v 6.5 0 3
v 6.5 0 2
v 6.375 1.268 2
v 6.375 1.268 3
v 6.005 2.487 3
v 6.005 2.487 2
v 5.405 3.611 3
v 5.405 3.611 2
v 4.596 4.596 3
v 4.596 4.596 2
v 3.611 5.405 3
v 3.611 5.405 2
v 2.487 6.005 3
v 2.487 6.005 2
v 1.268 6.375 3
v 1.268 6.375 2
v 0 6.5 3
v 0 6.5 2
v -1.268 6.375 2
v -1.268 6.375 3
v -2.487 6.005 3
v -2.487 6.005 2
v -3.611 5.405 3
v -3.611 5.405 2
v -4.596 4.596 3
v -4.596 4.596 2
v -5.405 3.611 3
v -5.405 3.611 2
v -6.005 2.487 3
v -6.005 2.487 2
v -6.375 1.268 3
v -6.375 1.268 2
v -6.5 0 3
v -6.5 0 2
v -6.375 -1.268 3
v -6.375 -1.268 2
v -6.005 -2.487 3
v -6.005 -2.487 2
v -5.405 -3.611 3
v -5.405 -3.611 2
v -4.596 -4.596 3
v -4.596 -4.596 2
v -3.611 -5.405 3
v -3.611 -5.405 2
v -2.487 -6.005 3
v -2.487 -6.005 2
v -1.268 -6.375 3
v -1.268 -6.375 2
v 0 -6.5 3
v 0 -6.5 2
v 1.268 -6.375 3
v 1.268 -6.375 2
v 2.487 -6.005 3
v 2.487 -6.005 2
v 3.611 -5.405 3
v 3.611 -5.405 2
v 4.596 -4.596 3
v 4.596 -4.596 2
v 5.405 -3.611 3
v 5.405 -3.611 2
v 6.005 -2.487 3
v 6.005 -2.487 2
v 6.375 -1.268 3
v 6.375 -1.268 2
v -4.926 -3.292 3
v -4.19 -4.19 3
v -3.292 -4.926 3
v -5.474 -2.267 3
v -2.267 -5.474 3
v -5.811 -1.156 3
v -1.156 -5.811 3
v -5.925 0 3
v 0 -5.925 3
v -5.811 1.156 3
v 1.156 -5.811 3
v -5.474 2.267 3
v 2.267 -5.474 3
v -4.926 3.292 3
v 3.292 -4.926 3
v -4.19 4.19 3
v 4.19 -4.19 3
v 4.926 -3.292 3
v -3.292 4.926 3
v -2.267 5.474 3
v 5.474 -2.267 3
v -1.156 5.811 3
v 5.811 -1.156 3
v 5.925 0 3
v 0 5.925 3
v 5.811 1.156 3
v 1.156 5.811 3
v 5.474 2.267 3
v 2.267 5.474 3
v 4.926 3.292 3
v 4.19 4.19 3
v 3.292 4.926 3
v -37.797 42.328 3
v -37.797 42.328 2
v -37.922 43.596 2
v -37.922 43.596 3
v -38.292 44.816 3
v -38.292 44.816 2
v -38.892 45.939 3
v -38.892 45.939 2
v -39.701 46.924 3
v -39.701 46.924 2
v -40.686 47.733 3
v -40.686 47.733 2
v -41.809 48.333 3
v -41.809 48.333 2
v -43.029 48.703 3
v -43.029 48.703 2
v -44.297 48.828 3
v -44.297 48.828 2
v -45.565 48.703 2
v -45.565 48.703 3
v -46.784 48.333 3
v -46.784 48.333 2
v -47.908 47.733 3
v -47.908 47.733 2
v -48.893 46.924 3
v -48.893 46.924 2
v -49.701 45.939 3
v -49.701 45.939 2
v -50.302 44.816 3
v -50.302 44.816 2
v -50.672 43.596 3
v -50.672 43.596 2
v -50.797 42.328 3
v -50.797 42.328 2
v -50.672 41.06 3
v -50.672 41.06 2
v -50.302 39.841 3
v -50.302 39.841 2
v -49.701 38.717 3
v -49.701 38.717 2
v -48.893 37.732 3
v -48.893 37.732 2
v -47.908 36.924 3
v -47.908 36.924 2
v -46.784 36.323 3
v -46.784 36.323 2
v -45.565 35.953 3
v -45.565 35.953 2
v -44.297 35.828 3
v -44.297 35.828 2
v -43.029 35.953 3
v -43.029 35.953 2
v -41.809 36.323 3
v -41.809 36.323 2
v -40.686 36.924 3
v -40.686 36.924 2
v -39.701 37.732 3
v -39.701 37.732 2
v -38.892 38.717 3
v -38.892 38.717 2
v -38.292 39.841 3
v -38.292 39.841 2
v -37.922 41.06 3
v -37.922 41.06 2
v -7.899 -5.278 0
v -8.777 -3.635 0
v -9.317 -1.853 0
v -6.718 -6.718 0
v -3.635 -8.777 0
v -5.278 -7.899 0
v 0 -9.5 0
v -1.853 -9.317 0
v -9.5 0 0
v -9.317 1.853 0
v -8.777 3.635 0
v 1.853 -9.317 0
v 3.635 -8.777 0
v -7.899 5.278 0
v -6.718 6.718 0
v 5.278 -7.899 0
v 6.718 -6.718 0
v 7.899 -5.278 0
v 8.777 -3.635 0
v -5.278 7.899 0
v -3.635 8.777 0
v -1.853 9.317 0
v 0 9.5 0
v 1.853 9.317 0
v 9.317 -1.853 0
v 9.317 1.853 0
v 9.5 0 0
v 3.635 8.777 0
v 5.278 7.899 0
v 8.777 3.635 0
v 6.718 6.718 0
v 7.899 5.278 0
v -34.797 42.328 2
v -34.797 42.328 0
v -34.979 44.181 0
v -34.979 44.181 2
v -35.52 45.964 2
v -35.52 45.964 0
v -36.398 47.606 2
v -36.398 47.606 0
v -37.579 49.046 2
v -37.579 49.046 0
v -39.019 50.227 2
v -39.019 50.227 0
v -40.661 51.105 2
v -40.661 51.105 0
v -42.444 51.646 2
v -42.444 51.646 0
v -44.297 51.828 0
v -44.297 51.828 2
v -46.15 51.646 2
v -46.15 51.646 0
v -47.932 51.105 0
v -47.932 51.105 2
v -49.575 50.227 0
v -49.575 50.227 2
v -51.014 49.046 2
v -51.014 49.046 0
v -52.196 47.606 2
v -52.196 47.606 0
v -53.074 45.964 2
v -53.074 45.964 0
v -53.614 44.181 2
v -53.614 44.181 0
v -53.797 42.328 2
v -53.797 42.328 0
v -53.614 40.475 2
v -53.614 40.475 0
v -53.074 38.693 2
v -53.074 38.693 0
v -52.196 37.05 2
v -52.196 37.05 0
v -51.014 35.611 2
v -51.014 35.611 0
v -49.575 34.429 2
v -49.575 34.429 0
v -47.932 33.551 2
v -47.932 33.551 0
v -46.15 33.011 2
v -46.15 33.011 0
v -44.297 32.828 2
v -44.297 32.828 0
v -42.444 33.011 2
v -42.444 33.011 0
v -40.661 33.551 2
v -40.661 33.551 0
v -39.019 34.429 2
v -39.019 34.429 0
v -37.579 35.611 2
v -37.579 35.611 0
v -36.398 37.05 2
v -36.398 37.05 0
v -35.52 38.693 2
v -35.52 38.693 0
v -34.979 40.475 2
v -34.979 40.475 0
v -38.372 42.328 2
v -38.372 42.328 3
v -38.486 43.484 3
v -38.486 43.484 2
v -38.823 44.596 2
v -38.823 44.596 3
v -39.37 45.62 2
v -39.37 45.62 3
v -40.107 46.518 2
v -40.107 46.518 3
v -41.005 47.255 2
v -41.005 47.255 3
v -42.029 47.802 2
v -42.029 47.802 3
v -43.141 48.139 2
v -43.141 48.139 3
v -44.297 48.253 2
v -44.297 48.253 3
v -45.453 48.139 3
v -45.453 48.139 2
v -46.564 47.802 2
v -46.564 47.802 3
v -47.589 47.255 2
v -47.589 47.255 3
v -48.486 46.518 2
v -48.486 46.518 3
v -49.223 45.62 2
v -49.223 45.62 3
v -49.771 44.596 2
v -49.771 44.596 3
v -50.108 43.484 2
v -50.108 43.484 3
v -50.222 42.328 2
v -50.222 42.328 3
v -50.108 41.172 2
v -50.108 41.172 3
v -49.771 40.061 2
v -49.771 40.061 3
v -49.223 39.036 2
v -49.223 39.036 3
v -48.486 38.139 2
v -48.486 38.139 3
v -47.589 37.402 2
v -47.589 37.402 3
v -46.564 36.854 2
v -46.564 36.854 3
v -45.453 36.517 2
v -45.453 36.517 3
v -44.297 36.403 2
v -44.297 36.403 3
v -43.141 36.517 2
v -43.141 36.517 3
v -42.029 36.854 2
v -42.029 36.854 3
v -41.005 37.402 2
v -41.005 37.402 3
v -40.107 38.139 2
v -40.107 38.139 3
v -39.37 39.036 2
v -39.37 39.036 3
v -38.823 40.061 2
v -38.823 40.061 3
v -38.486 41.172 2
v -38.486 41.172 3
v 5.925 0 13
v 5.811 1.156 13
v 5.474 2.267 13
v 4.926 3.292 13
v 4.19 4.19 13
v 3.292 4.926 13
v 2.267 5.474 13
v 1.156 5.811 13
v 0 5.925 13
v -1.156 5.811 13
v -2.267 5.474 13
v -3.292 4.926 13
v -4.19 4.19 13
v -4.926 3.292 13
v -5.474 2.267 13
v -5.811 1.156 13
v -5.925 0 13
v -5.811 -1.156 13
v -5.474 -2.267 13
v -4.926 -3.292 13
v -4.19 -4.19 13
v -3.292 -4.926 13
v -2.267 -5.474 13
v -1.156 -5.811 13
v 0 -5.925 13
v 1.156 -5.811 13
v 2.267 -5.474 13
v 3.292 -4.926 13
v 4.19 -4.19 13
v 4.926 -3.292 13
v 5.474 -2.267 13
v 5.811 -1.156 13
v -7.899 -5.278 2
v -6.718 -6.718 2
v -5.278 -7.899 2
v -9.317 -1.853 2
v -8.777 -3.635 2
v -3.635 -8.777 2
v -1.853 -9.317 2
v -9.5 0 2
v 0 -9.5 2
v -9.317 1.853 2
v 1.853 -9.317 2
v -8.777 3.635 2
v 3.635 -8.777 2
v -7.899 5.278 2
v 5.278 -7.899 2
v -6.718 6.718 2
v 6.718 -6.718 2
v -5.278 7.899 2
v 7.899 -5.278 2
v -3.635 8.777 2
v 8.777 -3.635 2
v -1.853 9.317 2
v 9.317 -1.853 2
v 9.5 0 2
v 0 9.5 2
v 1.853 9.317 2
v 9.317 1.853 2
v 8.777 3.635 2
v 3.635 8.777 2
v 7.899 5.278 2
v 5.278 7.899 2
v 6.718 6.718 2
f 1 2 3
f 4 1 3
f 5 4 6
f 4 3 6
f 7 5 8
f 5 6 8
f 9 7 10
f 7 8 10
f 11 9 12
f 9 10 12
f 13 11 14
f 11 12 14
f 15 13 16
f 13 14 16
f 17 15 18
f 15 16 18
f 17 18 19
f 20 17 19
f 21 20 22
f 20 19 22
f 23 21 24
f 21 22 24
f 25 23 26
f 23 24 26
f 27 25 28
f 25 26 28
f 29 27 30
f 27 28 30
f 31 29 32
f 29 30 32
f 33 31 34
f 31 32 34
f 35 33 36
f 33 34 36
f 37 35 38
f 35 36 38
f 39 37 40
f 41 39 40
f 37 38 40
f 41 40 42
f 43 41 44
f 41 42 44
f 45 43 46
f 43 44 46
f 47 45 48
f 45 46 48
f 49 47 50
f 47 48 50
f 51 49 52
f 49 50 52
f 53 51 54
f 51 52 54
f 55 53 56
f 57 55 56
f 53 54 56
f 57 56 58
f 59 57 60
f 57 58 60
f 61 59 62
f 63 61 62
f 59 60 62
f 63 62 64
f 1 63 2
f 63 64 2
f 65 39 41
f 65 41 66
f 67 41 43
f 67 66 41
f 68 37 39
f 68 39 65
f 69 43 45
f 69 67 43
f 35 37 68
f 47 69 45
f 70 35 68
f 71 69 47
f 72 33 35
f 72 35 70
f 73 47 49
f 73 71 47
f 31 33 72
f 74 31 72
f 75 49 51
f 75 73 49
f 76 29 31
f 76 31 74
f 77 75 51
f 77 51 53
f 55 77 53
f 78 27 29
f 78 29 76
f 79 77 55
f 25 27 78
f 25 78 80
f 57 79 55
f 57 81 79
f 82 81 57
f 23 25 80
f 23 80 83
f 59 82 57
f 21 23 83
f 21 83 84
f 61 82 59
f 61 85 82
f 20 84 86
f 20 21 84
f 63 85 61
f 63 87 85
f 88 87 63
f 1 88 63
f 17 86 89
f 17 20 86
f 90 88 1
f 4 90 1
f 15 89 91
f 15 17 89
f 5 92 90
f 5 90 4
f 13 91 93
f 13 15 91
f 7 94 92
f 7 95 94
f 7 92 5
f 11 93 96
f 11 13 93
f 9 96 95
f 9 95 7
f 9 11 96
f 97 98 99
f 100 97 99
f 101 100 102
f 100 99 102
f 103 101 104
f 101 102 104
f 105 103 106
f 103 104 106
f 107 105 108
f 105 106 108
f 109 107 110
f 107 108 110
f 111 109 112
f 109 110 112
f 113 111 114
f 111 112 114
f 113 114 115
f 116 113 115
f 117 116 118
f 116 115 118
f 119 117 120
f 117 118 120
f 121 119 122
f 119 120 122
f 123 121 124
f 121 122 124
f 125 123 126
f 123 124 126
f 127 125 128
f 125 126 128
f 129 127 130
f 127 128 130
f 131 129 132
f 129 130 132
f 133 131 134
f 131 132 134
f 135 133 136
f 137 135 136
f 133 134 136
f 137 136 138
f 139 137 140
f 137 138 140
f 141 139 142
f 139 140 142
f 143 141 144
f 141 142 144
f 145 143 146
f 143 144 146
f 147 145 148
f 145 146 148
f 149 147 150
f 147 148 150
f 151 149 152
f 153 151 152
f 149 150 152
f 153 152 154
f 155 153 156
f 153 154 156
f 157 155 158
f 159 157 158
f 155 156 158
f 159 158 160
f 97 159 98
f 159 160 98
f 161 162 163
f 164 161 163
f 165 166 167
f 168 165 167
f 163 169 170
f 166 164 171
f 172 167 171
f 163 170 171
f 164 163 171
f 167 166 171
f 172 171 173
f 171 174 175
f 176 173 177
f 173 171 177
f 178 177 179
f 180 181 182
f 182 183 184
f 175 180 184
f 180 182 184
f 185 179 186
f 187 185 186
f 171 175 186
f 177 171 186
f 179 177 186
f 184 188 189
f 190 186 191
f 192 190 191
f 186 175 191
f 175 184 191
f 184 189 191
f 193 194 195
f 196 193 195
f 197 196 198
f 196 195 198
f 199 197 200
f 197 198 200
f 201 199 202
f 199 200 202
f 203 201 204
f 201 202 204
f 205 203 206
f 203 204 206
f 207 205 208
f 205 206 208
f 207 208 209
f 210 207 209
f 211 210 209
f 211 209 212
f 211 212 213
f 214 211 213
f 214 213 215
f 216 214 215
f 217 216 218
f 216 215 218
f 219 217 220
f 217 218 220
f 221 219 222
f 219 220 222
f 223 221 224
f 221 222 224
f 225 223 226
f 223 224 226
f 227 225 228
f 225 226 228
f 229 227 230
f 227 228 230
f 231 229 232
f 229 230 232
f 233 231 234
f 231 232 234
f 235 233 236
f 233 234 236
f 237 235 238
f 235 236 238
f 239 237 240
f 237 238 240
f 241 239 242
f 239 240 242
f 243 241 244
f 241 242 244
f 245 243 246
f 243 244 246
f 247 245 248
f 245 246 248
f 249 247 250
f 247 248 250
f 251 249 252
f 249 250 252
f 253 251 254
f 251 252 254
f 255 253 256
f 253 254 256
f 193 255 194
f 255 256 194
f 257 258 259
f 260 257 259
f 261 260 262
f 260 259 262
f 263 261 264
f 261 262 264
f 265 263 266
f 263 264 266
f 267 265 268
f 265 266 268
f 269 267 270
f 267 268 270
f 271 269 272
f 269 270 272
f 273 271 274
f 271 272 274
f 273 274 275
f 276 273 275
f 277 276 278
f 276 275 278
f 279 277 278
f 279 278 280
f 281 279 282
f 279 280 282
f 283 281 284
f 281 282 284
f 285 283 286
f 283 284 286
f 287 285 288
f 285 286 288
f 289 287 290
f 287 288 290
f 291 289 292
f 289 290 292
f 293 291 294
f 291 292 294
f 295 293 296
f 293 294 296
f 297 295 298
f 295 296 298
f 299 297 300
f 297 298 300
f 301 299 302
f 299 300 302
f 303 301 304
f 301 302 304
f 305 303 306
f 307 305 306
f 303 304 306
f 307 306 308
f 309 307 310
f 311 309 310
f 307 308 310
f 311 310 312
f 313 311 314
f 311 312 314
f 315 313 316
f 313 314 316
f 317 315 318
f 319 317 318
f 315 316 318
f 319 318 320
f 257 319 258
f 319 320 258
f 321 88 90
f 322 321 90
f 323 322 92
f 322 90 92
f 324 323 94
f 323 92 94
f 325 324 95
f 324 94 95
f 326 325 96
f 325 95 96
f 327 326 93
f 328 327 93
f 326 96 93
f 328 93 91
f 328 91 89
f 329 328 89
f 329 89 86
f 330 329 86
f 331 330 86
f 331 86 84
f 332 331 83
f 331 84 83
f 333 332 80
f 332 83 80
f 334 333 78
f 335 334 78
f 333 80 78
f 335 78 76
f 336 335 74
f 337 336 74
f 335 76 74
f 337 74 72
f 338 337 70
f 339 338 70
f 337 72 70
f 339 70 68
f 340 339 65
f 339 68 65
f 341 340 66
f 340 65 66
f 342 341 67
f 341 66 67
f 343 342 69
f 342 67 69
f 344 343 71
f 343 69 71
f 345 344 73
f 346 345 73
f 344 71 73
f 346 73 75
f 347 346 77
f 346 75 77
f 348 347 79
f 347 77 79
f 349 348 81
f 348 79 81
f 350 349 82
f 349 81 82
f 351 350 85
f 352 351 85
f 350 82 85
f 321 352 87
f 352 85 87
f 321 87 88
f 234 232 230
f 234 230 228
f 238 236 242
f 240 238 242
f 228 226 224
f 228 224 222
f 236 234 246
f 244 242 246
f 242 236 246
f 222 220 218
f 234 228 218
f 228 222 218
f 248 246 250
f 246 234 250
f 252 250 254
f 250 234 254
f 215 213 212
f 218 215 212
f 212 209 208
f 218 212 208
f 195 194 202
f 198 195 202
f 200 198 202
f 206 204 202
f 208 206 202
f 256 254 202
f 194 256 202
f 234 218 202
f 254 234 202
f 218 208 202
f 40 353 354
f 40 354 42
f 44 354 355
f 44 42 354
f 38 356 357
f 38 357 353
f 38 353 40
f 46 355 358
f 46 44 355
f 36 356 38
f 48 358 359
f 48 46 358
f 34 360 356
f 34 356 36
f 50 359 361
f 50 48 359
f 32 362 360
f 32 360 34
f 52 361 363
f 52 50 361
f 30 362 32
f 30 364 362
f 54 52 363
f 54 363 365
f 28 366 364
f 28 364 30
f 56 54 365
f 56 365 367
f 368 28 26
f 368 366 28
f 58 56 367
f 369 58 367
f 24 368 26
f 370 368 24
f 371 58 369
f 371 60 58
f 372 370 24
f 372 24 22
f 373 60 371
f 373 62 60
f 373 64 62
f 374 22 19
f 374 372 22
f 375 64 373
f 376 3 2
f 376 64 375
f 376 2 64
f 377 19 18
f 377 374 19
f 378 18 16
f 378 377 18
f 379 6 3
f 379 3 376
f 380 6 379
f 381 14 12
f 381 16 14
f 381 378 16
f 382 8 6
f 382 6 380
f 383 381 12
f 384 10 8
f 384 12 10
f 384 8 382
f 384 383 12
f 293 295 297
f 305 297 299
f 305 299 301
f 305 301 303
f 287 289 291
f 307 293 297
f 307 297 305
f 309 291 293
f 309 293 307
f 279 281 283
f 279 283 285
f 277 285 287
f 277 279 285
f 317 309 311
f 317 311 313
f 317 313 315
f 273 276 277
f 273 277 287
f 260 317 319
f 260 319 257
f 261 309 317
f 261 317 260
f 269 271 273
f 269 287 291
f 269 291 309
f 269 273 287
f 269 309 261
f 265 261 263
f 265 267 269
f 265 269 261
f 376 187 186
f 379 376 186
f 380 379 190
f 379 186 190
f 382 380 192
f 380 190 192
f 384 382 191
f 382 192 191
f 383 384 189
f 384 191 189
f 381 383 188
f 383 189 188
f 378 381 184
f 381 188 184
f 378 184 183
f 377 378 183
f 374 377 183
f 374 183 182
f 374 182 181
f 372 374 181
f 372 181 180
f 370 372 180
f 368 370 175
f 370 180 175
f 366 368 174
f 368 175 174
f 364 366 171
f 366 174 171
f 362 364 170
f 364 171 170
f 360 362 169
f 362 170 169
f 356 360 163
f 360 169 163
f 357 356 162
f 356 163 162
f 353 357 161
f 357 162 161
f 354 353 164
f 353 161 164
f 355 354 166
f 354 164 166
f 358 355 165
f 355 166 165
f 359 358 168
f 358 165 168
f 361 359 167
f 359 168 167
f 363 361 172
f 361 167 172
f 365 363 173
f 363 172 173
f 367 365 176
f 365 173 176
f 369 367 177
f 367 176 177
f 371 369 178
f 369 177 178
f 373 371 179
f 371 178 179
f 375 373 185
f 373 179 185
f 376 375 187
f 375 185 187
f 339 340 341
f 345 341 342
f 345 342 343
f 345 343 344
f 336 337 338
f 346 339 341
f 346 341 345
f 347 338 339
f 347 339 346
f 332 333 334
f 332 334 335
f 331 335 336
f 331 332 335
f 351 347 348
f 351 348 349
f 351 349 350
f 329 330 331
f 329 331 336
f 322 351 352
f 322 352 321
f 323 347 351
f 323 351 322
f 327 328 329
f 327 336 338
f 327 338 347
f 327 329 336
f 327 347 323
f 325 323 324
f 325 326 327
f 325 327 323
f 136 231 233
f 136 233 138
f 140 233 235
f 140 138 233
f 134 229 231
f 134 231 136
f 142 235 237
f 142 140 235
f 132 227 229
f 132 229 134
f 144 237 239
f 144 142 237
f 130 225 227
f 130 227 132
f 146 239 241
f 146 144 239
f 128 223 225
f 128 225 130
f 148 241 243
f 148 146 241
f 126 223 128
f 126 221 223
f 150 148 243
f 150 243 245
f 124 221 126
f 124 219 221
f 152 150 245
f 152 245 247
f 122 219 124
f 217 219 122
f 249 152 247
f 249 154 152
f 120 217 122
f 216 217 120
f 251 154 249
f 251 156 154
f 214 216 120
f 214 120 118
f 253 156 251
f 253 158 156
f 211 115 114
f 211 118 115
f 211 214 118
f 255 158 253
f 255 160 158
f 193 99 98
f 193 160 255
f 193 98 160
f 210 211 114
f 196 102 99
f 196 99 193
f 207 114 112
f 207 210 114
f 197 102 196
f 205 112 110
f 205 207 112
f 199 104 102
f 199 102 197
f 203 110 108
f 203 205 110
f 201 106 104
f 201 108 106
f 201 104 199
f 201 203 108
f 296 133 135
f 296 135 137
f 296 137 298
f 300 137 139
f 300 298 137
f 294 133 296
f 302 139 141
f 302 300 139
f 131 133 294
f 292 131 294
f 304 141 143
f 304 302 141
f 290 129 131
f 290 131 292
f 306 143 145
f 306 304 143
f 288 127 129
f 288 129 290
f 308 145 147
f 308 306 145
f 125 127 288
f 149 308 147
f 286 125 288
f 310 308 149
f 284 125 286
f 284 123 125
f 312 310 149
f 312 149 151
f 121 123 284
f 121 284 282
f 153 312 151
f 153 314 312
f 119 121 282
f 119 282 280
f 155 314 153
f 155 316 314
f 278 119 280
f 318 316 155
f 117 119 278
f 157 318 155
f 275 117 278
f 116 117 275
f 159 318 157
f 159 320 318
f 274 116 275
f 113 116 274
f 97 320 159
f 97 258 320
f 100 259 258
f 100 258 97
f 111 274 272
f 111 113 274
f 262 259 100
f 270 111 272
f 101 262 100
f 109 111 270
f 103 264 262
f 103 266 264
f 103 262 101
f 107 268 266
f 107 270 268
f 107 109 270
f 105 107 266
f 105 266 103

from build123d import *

# Parameters (mm, degrees)
F0_R      = 9.5
F1_DEPTH  = 2
F2_R      = 6.5
F3_DEPTH  = 1
F4_R      = 5.925
F5_DEPTH  = 10
F6_R      = 9.5
F7_DEPTH  = 2
F8_R      = 6.5
F9_DEPTH  = 1
F10_R     = 5.925
F11_DEPTH = 1


with BuildPart() as f1:
    # F0 (on Top) → F1 (new body)
    with BuildSketch(Plane.XY):
        Circle(F0_R)
    extrude(amount=F1_DEPTH)

    # F2 (on face) → F3 (join)
    with BuildSketch(Plane.XY.offset(2)):
        Circle(F2_R)
    extrude(amount=F3_DEPTH)

    # F4 (on face) → F5 (join)
    with BuildSketch(Plane.XY.offset(3)):
        Circle(F4_R)
    extrude(amount=F5_DEPTH)


with BuildPart() as f7:
    # F6 (on Top) → F7 (new body)
    with BuildSketch(Plane.XY):
        with Locations((-44.296876, 42.328127)):
            Circle(F6_R)
    extrude(amount=F7_DEPTH)

    # F8 (on face) → F9 (join)
    with BuildSketch(Plane.XY.offset(2)):
        with Locations((-44.296876, 42.328127)):
            Circle(F8_R)
    extrude(amount=F9_DEPTH)

    # F10 (on face) → F11 (cut)
    with BuildSketch(Plane.XY.offset(3)):
        with Locations((-44.296876, 42.328127)):
            Circle(F10_R)
    extrude(amount=-F11_DEPTH, mode=Mode.SUBTRACT)


solid = Compound([f1.part, f7.part])
